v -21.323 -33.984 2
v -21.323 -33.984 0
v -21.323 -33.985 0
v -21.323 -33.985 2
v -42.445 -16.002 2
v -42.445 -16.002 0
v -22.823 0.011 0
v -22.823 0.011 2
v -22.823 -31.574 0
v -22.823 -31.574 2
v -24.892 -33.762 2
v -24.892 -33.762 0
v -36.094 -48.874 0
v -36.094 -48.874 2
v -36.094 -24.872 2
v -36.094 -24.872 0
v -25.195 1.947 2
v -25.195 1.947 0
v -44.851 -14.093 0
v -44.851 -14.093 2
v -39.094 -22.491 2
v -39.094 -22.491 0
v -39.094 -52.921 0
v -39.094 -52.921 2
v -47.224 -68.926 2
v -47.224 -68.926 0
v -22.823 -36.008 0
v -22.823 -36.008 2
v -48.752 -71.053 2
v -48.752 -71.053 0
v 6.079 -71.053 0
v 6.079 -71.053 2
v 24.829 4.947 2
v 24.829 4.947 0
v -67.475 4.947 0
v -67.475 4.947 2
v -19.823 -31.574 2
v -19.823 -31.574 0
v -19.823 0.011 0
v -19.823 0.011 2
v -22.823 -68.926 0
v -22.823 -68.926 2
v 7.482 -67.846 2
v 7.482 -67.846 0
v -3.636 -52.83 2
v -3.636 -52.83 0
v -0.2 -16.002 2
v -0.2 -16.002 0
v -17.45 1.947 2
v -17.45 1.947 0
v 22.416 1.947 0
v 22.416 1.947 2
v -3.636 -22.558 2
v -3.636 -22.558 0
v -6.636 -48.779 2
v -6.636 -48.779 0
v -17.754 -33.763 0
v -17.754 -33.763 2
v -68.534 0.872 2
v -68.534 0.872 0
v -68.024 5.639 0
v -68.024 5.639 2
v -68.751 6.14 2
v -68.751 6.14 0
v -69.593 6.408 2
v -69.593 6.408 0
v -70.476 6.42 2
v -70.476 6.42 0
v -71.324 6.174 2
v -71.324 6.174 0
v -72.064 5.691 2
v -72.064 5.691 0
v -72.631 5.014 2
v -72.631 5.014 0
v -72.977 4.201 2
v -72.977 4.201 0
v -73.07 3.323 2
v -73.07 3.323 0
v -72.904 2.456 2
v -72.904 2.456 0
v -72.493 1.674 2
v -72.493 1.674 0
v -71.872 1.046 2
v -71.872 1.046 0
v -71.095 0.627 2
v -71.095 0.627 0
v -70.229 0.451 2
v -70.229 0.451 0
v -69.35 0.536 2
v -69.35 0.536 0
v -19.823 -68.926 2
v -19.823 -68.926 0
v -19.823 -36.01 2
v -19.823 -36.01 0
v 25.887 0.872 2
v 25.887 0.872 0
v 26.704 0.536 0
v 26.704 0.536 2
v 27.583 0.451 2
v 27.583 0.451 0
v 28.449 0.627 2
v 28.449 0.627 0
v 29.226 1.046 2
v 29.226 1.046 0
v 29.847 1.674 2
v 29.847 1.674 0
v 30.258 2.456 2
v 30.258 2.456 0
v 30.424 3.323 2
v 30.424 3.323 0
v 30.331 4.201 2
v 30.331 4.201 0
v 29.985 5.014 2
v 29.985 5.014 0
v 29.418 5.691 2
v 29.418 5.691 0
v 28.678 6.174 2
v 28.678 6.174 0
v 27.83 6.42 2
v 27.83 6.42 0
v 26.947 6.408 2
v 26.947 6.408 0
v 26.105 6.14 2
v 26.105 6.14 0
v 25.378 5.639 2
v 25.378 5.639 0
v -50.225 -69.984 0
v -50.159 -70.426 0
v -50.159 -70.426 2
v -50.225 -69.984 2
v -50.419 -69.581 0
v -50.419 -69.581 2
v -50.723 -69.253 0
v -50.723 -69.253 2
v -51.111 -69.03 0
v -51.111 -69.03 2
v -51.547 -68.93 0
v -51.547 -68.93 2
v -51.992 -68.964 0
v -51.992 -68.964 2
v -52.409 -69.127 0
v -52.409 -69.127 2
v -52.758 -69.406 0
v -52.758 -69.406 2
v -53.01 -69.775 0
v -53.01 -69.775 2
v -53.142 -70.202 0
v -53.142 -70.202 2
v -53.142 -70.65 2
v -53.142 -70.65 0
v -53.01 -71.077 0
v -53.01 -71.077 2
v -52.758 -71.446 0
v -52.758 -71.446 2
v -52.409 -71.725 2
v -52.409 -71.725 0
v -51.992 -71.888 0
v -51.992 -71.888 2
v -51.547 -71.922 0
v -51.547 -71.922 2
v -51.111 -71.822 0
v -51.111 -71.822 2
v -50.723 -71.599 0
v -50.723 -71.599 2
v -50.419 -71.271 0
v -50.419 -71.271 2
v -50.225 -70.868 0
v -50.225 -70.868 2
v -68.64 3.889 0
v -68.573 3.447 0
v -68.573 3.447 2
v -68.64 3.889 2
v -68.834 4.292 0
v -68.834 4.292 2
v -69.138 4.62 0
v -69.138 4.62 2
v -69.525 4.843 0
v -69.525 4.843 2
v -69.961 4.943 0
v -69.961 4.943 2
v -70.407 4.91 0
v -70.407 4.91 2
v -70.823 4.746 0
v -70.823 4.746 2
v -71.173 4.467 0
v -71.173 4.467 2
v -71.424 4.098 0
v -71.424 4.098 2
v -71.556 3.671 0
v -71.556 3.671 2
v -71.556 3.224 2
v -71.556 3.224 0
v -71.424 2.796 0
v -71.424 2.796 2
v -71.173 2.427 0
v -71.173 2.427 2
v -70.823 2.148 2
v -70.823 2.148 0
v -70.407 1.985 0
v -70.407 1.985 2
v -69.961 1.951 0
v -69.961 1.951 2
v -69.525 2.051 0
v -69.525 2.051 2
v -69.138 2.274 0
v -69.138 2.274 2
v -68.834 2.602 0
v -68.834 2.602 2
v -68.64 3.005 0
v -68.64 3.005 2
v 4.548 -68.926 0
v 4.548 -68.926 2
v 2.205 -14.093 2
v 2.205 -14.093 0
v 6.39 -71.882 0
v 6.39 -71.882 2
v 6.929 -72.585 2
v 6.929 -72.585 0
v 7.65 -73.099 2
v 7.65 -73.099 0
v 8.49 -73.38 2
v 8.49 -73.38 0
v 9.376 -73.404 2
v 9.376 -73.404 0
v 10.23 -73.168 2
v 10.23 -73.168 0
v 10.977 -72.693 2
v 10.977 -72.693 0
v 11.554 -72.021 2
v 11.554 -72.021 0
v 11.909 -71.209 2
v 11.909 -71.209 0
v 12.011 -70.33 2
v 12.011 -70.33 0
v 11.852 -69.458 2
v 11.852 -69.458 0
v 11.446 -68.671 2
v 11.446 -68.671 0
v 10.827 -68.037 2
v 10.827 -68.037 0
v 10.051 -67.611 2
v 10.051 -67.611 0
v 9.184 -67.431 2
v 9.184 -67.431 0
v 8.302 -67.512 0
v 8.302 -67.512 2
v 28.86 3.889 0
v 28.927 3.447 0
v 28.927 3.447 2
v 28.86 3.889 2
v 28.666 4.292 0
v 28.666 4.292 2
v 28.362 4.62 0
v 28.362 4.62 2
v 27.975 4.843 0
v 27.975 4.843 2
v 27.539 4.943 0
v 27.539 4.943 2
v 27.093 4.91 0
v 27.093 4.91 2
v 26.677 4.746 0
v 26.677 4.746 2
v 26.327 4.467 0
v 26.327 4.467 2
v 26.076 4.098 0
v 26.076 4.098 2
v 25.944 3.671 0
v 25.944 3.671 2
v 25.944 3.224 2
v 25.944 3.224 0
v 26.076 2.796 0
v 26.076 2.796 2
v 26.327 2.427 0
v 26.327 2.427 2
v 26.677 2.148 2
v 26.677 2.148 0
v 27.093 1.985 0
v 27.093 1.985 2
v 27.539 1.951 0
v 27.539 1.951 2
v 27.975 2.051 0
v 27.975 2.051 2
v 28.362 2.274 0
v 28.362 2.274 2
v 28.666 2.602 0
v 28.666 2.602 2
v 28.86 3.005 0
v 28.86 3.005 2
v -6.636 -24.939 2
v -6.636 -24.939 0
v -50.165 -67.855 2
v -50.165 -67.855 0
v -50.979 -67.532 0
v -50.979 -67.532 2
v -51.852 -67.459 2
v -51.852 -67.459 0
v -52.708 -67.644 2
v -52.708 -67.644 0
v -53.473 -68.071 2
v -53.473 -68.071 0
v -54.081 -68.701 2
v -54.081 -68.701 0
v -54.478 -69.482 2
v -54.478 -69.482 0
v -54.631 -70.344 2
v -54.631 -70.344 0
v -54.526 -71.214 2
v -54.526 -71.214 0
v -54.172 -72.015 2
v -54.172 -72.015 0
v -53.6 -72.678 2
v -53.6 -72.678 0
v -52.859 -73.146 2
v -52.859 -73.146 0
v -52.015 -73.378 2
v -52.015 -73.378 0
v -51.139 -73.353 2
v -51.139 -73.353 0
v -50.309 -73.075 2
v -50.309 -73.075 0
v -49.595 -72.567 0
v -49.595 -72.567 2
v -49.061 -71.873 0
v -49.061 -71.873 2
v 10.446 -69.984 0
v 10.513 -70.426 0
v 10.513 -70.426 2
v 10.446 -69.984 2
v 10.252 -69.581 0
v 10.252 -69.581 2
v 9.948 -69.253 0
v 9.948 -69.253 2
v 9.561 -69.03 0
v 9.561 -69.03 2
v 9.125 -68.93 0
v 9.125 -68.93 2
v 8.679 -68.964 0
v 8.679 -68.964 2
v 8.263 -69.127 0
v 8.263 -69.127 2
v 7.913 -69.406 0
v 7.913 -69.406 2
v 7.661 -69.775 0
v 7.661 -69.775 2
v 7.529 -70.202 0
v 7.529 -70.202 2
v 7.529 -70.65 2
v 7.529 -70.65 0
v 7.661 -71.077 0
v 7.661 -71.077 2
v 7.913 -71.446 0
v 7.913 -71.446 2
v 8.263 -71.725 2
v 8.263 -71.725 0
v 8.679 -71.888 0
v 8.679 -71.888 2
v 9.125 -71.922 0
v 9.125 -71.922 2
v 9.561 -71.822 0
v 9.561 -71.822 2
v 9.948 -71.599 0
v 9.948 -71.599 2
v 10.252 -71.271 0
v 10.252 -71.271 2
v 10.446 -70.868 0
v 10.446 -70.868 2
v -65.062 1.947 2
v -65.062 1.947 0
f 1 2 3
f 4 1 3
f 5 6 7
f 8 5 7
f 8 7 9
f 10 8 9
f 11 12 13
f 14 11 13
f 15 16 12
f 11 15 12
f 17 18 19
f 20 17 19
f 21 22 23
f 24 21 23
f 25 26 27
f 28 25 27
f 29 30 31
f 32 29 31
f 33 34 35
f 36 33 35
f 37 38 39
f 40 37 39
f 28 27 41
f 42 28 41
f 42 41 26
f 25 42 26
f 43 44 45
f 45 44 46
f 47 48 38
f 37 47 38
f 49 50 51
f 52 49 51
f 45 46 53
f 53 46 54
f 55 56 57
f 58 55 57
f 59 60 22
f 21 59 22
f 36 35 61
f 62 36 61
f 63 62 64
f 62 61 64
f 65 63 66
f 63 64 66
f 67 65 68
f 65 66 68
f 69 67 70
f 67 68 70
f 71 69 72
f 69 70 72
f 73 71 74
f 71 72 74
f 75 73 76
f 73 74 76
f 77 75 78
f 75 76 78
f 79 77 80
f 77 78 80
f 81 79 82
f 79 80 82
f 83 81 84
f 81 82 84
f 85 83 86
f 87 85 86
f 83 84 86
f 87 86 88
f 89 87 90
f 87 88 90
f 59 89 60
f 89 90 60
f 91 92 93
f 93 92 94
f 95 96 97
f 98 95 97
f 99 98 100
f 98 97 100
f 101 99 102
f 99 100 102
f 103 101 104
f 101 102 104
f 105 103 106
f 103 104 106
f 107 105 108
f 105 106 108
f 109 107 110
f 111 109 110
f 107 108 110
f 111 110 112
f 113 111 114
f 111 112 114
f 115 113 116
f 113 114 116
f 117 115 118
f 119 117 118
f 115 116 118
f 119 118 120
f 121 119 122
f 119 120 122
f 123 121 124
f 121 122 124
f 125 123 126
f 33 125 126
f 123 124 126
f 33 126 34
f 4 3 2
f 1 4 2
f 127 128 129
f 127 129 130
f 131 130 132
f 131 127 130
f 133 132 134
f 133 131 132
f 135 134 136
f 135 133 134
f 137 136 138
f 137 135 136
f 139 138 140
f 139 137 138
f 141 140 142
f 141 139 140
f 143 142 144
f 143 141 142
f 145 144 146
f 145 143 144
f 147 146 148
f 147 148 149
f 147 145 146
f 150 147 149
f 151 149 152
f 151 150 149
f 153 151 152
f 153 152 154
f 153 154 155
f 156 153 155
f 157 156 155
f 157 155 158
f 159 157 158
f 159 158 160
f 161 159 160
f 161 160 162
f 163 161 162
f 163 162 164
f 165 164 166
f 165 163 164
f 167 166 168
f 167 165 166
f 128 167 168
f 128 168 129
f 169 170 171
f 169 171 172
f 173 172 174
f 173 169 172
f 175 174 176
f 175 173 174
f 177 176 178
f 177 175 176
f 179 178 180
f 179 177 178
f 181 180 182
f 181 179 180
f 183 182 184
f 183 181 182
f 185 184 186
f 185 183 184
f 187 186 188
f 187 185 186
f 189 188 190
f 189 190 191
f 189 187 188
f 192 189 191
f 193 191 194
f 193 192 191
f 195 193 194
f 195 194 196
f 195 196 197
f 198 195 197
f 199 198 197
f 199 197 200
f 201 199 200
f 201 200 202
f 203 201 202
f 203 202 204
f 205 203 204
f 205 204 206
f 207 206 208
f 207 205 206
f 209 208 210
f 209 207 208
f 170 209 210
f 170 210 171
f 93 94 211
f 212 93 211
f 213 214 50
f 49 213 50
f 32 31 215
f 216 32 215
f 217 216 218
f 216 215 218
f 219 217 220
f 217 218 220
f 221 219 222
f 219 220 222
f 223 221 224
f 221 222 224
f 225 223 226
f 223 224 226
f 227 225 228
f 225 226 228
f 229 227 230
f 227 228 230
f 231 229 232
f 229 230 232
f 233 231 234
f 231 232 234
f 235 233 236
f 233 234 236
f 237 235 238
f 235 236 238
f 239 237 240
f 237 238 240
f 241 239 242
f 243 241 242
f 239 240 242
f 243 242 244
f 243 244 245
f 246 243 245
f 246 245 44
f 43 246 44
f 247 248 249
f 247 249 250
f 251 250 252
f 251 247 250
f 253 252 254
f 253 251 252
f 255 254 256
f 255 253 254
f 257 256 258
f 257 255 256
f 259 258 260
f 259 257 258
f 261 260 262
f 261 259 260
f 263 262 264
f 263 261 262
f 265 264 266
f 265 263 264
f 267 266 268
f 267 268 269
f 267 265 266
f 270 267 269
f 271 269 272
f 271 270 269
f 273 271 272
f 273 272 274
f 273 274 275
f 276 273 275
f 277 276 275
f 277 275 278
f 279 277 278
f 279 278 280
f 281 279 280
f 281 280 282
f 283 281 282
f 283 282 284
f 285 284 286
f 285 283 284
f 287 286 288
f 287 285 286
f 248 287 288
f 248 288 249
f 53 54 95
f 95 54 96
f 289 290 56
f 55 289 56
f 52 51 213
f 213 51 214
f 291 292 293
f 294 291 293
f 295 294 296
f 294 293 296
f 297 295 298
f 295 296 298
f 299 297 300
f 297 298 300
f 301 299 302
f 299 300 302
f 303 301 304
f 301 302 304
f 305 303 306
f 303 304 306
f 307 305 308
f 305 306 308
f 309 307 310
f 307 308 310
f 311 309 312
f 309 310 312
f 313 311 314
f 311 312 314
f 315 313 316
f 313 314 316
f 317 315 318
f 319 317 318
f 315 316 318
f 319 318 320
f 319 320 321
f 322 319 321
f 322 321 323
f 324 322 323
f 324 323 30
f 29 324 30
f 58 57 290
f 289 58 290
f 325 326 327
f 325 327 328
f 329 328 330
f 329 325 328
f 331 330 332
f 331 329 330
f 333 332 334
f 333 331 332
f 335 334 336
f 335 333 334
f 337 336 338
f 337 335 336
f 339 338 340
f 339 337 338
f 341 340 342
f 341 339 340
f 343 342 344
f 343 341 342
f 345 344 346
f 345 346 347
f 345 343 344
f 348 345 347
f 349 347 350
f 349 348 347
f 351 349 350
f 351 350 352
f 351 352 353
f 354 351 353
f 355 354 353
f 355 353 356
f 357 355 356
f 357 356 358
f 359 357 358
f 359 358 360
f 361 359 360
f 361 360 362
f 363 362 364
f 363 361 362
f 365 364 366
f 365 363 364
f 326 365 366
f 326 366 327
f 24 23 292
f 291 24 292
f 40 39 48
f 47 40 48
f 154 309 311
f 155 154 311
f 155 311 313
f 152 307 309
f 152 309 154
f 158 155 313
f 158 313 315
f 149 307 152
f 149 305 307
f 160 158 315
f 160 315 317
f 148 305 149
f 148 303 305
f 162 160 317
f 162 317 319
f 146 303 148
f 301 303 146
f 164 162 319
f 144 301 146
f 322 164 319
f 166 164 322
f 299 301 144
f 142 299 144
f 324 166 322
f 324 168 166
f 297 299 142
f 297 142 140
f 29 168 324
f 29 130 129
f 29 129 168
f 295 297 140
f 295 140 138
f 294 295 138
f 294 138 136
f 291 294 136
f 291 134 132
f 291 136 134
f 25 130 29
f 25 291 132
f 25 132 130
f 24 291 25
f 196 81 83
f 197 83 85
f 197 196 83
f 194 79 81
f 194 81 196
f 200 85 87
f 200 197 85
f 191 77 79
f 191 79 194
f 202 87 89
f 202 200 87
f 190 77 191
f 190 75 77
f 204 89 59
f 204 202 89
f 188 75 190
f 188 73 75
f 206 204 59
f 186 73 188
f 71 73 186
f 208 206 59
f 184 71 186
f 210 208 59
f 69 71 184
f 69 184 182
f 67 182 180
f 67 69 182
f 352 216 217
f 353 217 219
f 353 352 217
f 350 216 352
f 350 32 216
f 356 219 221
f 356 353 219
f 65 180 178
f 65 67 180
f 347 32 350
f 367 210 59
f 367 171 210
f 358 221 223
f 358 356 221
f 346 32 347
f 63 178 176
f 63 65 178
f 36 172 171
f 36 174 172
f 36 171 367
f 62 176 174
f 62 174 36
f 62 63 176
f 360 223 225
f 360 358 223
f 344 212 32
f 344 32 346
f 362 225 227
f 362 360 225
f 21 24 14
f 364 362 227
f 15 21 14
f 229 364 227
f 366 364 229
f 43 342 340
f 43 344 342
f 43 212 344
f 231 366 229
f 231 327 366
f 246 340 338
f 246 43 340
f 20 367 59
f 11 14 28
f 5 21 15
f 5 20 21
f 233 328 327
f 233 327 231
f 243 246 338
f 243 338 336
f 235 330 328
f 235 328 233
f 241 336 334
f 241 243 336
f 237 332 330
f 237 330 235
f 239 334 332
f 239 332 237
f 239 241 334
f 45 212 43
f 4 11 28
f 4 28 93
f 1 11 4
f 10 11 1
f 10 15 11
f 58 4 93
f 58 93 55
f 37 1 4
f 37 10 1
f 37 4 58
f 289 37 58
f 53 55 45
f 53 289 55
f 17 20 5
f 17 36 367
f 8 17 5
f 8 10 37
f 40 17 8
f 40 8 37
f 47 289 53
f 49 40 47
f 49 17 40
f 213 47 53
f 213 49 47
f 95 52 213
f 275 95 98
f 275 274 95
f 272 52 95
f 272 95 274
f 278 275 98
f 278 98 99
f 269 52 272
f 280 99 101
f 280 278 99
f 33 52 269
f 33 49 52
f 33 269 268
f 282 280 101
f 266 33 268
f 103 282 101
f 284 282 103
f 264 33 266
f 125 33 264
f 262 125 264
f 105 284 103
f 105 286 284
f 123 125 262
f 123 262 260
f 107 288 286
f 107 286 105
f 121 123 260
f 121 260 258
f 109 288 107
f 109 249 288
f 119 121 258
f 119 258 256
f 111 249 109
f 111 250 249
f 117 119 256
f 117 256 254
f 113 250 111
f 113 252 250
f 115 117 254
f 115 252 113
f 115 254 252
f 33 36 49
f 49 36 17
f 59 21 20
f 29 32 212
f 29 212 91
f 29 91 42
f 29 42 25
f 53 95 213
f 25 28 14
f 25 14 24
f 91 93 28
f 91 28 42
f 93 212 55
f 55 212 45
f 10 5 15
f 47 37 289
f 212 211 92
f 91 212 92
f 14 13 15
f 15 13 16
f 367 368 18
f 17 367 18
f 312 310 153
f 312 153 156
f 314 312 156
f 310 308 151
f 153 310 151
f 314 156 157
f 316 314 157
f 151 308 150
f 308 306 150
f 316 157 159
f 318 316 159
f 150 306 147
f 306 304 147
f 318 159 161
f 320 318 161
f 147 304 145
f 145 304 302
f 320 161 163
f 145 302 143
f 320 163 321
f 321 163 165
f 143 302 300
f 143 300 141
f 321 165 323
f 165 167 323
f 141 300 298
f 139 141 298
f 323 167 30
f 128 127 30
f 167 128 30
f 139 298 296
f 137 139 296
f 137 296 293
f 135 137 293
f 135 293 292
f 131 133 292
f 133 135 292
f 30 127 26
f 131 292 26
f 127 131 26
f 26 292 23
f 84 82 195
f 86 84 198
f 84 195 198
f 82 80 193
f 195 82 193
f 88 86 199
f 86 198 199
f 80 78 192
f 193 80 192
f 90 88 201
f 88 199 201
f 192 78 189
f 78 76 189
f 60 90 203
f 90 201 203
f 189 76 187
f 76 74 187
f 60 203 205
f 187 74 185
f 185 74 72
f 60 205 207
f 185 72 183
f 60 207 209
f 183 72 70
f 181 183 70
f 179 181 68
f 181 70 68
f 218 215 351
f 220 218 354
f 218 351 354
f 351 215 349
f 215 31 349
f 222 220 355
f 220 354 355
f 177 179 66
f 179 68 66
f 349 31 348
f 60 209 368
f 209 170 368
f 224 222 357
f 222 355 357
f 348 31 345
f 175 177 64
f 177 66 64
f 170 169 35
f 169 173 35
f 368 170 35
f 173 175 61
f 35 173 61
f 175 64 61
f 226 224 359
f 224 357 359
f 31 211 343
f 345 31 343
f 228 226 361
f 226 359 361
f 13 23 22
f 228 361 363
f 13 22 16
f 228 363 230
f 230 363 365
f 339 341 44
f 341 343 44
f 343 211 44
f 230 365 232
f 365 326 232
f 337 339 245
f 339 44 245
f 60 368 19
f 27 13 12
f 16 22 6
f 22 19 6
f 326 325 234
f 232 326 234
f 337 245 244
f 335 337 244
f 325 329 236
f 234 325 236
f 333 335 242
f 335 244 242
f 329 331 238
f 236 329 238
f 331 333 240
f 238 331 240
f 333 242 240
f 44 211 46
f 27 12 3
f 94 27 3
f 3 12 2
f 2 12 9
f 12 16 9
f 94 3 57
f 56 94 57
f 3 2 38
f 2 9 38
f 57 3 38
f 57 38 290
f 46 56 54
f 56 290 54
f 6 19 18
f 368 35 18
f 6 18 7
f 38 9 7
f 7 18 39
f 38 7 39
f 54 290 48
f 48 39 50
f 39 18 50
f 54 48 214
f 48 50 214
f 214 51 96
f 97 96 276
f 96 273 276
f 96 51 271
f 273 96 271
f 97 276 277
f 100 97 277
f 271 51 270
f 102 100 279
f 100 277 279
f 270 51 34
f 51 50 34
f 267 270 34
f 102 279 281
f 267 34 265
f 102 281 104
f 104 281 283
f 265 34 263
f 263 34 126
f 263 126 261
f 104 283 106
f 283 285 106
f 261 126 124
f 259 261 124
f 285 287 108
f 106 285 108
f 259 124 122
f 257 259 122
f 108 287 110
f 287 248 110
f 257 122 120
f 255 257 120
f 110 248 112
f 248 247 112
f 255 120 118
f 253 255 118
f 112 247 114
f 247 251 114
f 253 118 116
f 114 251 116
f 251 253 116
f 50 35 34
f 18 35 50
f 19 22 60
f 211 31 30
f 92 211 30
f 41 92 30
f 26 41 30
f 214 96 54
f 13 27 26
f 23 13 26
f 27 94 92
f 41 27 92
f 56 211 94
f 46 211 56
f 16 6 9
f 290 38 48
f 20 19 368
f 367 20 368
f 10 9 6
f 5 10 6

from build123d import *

# Parameters (mm, degrees)
ESBO_O1_R                = 1.5
RESSALTO_EXTRUS_O1_DEPTH = 2


with BuildPart() as part:
    # Esboço1 → Ressalto-extrusão1 (new body)
    with BuildSketch(Plane.XY):
        with BuildLine():
            Line((24.828910237, 4.947115543), (-67.47493734, 4.947115543))
            ThreePointArc((-67.47493734, 4.947115543), (-72.976635365, 4.201423413), (-68.533513234, 0.872248794))
            Line((-68.533513234, 0.872248794), (-39.094485287, -22.491099002))
            Line((-39.094485287, -22.491099002), (-39.094485287, -52.920988494))
            Line((-39.094485287, -52.920988494), (-50.165018851, -67.855248208))
            ThreePointArc((-50.165018851, -67.855248208), (-54.378358474, -71.627569421), (-48.752314099, -71.052884457))
            Line((-48.752314099, -71.052884457), (6.078910237, -71.052884457))
            ThreePointArc((6.078910237, -71.052884457), (11.761262781, -71.628269251), (7.481508074, -67.846219841))
            Line((7.481508074, -67.846219841), (-3.636404062, -52.83035158))
            Line((-3.636404062, -52.83035158), (-3.636404062, -22.558447224))
            Line((-3.636404062, -22.558447224), (25.887486132, 0.872248794))
            ThreePointArc((25.887486132, 0.872248794), (30.330608262, 4.201423413), (24.828910237, 4.947115543))
        make_face()
        with Locations((-51.658717817, -70.426041486)):
            Circle(ESBO_O1_R, mode=Mode.SUBTRACT)
        Polygon((-22.823013551, -36.008314403), (-22.823013551, -68.926041486), (-47.22441071, -68.926041486), align=None, mode=Mode.SUBTRACT)
        Polygon((-36.094485287, -24.871953544), (-24.892352245, -33.762169987), (-36.094485287, -48.873958703), align=None, mode=Mode.SUBTRACT)
        with Locations((9.012690715, -70.426041486)):
            Circle(ESBO_O1_R, mode=Mode.SUBTRACT)
        Polygon((-19.823013551, -36.010232621), (4.548209245, -68.926041486), (-19.823013551, -68.926041486), align=None, mode=Mode.SUBTRACT)
        Polygon((-21.323013551, -33.984330445), (-21.322839799, -33.984565114), (-21.323013551, -33.984799507), align=None, mode=Mode.SUBTRACT)
        Polygon((-6.636404062, -24.939301765), (-6.636404062, -48.778547228), (-17.754316199, -33.762678967), align=None, mode=Mode.SUBTRACT)
        Polygon((-42.445301093, -16.001887011), (-22.823013551, 0.011039778), (-22.823013551, -31.574491147), align=None, mode=Mode.SUBTRACT)
        with Locations((-70.073013551, 3.447115543)):
            Circle(ESBO_O1_R, mode=Mode.SUBTRACT)
        Polygon((-65.061973687, 1.947115543), (-25.195486483, 1.947115543), (-44.850847826, -14.092801389), align=None, mode=Mode.SUBTRACT)
        Polygon((-19.823013551, -31.574491147), (-19.823013551, 0.011063284), (-0.200409257, -16.00163563), align=None, mode=Mode.SUBTRACT)
        Polygon((2.205145312, -14.09254379), (-17.450497364, 1.947115543), (22.415946584, 1.947115543), align=None, mode=Mode.SUBTRACT)
        with Locations((27.426986449, 3.447115543)):
            Circle(ESBO_O1_R, mode=Mode.SUBTRACT)
    extrude(amount=RESSALTO_EXTRUS_O1_DEPTH)


solid = part.part
